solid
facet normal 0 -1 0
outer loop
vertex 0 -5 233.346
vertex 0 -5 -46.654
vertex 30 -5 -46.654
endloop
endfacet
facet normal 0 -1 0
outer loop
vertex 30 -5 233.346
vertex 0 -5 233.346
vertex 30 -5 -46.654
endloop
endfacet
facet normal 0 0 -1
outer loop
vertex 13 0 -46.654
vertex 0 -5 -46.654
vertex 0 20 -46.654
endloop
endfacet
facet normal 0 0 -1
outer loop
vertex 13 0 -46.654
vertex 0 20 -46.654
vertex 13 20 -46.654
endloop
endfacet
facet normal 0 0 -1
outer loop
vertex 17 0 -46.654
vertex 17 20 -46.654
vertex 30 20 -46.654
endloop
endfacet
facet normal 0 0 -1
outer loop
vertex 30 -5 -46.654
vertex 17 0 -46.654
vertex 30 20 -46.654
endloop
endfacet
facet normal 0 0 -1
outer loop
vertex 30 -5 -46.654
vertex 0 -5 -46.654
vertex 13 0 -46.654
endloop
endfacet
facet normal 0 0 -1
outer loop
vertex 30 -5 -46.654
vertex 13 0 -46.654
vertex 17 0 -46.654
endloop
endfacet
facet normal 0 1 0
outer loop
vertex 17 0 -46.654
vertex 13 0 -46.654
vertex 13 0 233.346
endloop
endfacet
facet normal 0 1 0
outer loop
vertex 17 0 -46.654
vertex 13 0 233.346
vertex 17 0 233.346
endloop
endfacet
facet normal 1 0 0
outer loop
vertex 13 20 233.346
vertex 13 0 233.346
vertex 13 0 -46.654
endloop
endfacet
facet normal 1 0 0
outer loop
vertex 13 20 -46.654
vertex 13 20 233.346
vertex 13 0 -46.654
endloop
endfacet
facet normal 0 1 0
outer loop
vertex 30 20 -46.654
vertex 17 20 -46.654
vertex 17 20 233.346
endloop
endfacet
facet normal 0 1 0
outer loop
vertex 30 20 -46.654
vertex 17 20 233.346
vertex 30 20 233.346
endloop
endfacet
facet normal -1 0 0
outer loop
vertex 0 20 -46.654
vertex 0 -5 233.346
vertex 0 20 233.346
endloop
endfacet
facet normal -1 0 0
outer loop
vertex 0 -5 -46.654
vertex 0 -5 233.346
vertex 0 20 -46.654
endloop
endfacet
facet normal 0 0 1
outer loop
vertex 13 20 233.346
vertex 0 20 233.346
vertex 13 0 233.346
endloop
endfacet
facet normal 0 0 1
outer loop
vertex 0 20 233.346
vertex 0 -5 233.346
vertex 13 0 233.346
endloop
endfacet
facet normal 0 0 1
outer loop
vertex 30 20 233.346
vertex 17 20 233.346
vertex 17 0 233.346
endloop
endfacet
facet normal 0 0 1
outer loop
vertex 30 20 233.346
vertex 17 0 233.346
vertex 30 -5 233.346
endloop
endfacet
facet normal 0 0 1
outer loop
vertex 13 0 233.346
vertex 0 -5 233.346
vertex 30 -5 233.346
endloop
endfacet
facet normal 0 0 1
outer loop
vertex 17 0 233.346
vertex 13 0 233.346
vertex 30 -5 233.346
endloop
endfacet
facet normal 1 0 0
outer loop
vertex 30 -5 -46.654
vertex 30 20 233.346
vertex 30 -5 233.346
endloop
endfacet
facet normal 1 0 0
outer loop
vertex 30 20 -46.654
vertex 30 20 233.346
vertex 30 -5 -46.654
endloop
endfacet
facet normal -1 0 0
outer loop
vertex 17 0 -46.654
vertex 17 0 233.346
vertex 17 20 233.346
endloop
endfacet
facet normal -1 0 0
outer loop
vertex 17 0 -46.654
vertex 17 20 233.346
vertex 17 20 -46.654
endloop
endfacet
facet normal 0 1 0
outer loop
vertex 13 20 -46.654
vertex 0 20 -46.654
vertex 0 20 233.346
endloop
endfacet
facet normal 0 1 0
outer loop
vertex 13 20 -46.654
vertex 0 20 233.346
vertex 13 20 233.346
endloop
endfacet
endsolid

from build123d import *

# Parameters (mm, degrees)
SKETCH_1_W      = 30
SKETCH_1_H      = 280
EXTRUDE_1_DEPTH = 5
SKETCH_2_W      = 13
SKETCH_2_H      = 280
EXTRUDE_2_DEPTH = 20


with BuildPart() as part:
    # 草图1 → 凸台-拉伸1 (new body)
    with BuildSketch(Plane(origin=(0, 0, 0), x_dir=(1, 0, 0), z_dir=(0, 1, 0))):
        with Locations((15, -93.34585106)):
            Rectangle(SKETCH_1_W, SKETCH_1_H)
    extrude(amount=-EXTRUDE_1_DEPTH)

    # 草图2 → 凸台-拉伸2 (add)
    with BuildSketch(Plane(origin=(0, 0, 0), x_dir=(1, 0, 0), z_dir=(0, 1, 0))):
        with Locations((6.5, -93.34585106)):
            Rectangle(SKETCH_2_W, SKETCH_2_H)
        with Locations((23.5, -93.34585106)):
            Rectangle(SKETCH_2_W, SKETCH_2_H)
    extrude(amount=EXTRUDE_2_DEPTH)


solid = part.part
